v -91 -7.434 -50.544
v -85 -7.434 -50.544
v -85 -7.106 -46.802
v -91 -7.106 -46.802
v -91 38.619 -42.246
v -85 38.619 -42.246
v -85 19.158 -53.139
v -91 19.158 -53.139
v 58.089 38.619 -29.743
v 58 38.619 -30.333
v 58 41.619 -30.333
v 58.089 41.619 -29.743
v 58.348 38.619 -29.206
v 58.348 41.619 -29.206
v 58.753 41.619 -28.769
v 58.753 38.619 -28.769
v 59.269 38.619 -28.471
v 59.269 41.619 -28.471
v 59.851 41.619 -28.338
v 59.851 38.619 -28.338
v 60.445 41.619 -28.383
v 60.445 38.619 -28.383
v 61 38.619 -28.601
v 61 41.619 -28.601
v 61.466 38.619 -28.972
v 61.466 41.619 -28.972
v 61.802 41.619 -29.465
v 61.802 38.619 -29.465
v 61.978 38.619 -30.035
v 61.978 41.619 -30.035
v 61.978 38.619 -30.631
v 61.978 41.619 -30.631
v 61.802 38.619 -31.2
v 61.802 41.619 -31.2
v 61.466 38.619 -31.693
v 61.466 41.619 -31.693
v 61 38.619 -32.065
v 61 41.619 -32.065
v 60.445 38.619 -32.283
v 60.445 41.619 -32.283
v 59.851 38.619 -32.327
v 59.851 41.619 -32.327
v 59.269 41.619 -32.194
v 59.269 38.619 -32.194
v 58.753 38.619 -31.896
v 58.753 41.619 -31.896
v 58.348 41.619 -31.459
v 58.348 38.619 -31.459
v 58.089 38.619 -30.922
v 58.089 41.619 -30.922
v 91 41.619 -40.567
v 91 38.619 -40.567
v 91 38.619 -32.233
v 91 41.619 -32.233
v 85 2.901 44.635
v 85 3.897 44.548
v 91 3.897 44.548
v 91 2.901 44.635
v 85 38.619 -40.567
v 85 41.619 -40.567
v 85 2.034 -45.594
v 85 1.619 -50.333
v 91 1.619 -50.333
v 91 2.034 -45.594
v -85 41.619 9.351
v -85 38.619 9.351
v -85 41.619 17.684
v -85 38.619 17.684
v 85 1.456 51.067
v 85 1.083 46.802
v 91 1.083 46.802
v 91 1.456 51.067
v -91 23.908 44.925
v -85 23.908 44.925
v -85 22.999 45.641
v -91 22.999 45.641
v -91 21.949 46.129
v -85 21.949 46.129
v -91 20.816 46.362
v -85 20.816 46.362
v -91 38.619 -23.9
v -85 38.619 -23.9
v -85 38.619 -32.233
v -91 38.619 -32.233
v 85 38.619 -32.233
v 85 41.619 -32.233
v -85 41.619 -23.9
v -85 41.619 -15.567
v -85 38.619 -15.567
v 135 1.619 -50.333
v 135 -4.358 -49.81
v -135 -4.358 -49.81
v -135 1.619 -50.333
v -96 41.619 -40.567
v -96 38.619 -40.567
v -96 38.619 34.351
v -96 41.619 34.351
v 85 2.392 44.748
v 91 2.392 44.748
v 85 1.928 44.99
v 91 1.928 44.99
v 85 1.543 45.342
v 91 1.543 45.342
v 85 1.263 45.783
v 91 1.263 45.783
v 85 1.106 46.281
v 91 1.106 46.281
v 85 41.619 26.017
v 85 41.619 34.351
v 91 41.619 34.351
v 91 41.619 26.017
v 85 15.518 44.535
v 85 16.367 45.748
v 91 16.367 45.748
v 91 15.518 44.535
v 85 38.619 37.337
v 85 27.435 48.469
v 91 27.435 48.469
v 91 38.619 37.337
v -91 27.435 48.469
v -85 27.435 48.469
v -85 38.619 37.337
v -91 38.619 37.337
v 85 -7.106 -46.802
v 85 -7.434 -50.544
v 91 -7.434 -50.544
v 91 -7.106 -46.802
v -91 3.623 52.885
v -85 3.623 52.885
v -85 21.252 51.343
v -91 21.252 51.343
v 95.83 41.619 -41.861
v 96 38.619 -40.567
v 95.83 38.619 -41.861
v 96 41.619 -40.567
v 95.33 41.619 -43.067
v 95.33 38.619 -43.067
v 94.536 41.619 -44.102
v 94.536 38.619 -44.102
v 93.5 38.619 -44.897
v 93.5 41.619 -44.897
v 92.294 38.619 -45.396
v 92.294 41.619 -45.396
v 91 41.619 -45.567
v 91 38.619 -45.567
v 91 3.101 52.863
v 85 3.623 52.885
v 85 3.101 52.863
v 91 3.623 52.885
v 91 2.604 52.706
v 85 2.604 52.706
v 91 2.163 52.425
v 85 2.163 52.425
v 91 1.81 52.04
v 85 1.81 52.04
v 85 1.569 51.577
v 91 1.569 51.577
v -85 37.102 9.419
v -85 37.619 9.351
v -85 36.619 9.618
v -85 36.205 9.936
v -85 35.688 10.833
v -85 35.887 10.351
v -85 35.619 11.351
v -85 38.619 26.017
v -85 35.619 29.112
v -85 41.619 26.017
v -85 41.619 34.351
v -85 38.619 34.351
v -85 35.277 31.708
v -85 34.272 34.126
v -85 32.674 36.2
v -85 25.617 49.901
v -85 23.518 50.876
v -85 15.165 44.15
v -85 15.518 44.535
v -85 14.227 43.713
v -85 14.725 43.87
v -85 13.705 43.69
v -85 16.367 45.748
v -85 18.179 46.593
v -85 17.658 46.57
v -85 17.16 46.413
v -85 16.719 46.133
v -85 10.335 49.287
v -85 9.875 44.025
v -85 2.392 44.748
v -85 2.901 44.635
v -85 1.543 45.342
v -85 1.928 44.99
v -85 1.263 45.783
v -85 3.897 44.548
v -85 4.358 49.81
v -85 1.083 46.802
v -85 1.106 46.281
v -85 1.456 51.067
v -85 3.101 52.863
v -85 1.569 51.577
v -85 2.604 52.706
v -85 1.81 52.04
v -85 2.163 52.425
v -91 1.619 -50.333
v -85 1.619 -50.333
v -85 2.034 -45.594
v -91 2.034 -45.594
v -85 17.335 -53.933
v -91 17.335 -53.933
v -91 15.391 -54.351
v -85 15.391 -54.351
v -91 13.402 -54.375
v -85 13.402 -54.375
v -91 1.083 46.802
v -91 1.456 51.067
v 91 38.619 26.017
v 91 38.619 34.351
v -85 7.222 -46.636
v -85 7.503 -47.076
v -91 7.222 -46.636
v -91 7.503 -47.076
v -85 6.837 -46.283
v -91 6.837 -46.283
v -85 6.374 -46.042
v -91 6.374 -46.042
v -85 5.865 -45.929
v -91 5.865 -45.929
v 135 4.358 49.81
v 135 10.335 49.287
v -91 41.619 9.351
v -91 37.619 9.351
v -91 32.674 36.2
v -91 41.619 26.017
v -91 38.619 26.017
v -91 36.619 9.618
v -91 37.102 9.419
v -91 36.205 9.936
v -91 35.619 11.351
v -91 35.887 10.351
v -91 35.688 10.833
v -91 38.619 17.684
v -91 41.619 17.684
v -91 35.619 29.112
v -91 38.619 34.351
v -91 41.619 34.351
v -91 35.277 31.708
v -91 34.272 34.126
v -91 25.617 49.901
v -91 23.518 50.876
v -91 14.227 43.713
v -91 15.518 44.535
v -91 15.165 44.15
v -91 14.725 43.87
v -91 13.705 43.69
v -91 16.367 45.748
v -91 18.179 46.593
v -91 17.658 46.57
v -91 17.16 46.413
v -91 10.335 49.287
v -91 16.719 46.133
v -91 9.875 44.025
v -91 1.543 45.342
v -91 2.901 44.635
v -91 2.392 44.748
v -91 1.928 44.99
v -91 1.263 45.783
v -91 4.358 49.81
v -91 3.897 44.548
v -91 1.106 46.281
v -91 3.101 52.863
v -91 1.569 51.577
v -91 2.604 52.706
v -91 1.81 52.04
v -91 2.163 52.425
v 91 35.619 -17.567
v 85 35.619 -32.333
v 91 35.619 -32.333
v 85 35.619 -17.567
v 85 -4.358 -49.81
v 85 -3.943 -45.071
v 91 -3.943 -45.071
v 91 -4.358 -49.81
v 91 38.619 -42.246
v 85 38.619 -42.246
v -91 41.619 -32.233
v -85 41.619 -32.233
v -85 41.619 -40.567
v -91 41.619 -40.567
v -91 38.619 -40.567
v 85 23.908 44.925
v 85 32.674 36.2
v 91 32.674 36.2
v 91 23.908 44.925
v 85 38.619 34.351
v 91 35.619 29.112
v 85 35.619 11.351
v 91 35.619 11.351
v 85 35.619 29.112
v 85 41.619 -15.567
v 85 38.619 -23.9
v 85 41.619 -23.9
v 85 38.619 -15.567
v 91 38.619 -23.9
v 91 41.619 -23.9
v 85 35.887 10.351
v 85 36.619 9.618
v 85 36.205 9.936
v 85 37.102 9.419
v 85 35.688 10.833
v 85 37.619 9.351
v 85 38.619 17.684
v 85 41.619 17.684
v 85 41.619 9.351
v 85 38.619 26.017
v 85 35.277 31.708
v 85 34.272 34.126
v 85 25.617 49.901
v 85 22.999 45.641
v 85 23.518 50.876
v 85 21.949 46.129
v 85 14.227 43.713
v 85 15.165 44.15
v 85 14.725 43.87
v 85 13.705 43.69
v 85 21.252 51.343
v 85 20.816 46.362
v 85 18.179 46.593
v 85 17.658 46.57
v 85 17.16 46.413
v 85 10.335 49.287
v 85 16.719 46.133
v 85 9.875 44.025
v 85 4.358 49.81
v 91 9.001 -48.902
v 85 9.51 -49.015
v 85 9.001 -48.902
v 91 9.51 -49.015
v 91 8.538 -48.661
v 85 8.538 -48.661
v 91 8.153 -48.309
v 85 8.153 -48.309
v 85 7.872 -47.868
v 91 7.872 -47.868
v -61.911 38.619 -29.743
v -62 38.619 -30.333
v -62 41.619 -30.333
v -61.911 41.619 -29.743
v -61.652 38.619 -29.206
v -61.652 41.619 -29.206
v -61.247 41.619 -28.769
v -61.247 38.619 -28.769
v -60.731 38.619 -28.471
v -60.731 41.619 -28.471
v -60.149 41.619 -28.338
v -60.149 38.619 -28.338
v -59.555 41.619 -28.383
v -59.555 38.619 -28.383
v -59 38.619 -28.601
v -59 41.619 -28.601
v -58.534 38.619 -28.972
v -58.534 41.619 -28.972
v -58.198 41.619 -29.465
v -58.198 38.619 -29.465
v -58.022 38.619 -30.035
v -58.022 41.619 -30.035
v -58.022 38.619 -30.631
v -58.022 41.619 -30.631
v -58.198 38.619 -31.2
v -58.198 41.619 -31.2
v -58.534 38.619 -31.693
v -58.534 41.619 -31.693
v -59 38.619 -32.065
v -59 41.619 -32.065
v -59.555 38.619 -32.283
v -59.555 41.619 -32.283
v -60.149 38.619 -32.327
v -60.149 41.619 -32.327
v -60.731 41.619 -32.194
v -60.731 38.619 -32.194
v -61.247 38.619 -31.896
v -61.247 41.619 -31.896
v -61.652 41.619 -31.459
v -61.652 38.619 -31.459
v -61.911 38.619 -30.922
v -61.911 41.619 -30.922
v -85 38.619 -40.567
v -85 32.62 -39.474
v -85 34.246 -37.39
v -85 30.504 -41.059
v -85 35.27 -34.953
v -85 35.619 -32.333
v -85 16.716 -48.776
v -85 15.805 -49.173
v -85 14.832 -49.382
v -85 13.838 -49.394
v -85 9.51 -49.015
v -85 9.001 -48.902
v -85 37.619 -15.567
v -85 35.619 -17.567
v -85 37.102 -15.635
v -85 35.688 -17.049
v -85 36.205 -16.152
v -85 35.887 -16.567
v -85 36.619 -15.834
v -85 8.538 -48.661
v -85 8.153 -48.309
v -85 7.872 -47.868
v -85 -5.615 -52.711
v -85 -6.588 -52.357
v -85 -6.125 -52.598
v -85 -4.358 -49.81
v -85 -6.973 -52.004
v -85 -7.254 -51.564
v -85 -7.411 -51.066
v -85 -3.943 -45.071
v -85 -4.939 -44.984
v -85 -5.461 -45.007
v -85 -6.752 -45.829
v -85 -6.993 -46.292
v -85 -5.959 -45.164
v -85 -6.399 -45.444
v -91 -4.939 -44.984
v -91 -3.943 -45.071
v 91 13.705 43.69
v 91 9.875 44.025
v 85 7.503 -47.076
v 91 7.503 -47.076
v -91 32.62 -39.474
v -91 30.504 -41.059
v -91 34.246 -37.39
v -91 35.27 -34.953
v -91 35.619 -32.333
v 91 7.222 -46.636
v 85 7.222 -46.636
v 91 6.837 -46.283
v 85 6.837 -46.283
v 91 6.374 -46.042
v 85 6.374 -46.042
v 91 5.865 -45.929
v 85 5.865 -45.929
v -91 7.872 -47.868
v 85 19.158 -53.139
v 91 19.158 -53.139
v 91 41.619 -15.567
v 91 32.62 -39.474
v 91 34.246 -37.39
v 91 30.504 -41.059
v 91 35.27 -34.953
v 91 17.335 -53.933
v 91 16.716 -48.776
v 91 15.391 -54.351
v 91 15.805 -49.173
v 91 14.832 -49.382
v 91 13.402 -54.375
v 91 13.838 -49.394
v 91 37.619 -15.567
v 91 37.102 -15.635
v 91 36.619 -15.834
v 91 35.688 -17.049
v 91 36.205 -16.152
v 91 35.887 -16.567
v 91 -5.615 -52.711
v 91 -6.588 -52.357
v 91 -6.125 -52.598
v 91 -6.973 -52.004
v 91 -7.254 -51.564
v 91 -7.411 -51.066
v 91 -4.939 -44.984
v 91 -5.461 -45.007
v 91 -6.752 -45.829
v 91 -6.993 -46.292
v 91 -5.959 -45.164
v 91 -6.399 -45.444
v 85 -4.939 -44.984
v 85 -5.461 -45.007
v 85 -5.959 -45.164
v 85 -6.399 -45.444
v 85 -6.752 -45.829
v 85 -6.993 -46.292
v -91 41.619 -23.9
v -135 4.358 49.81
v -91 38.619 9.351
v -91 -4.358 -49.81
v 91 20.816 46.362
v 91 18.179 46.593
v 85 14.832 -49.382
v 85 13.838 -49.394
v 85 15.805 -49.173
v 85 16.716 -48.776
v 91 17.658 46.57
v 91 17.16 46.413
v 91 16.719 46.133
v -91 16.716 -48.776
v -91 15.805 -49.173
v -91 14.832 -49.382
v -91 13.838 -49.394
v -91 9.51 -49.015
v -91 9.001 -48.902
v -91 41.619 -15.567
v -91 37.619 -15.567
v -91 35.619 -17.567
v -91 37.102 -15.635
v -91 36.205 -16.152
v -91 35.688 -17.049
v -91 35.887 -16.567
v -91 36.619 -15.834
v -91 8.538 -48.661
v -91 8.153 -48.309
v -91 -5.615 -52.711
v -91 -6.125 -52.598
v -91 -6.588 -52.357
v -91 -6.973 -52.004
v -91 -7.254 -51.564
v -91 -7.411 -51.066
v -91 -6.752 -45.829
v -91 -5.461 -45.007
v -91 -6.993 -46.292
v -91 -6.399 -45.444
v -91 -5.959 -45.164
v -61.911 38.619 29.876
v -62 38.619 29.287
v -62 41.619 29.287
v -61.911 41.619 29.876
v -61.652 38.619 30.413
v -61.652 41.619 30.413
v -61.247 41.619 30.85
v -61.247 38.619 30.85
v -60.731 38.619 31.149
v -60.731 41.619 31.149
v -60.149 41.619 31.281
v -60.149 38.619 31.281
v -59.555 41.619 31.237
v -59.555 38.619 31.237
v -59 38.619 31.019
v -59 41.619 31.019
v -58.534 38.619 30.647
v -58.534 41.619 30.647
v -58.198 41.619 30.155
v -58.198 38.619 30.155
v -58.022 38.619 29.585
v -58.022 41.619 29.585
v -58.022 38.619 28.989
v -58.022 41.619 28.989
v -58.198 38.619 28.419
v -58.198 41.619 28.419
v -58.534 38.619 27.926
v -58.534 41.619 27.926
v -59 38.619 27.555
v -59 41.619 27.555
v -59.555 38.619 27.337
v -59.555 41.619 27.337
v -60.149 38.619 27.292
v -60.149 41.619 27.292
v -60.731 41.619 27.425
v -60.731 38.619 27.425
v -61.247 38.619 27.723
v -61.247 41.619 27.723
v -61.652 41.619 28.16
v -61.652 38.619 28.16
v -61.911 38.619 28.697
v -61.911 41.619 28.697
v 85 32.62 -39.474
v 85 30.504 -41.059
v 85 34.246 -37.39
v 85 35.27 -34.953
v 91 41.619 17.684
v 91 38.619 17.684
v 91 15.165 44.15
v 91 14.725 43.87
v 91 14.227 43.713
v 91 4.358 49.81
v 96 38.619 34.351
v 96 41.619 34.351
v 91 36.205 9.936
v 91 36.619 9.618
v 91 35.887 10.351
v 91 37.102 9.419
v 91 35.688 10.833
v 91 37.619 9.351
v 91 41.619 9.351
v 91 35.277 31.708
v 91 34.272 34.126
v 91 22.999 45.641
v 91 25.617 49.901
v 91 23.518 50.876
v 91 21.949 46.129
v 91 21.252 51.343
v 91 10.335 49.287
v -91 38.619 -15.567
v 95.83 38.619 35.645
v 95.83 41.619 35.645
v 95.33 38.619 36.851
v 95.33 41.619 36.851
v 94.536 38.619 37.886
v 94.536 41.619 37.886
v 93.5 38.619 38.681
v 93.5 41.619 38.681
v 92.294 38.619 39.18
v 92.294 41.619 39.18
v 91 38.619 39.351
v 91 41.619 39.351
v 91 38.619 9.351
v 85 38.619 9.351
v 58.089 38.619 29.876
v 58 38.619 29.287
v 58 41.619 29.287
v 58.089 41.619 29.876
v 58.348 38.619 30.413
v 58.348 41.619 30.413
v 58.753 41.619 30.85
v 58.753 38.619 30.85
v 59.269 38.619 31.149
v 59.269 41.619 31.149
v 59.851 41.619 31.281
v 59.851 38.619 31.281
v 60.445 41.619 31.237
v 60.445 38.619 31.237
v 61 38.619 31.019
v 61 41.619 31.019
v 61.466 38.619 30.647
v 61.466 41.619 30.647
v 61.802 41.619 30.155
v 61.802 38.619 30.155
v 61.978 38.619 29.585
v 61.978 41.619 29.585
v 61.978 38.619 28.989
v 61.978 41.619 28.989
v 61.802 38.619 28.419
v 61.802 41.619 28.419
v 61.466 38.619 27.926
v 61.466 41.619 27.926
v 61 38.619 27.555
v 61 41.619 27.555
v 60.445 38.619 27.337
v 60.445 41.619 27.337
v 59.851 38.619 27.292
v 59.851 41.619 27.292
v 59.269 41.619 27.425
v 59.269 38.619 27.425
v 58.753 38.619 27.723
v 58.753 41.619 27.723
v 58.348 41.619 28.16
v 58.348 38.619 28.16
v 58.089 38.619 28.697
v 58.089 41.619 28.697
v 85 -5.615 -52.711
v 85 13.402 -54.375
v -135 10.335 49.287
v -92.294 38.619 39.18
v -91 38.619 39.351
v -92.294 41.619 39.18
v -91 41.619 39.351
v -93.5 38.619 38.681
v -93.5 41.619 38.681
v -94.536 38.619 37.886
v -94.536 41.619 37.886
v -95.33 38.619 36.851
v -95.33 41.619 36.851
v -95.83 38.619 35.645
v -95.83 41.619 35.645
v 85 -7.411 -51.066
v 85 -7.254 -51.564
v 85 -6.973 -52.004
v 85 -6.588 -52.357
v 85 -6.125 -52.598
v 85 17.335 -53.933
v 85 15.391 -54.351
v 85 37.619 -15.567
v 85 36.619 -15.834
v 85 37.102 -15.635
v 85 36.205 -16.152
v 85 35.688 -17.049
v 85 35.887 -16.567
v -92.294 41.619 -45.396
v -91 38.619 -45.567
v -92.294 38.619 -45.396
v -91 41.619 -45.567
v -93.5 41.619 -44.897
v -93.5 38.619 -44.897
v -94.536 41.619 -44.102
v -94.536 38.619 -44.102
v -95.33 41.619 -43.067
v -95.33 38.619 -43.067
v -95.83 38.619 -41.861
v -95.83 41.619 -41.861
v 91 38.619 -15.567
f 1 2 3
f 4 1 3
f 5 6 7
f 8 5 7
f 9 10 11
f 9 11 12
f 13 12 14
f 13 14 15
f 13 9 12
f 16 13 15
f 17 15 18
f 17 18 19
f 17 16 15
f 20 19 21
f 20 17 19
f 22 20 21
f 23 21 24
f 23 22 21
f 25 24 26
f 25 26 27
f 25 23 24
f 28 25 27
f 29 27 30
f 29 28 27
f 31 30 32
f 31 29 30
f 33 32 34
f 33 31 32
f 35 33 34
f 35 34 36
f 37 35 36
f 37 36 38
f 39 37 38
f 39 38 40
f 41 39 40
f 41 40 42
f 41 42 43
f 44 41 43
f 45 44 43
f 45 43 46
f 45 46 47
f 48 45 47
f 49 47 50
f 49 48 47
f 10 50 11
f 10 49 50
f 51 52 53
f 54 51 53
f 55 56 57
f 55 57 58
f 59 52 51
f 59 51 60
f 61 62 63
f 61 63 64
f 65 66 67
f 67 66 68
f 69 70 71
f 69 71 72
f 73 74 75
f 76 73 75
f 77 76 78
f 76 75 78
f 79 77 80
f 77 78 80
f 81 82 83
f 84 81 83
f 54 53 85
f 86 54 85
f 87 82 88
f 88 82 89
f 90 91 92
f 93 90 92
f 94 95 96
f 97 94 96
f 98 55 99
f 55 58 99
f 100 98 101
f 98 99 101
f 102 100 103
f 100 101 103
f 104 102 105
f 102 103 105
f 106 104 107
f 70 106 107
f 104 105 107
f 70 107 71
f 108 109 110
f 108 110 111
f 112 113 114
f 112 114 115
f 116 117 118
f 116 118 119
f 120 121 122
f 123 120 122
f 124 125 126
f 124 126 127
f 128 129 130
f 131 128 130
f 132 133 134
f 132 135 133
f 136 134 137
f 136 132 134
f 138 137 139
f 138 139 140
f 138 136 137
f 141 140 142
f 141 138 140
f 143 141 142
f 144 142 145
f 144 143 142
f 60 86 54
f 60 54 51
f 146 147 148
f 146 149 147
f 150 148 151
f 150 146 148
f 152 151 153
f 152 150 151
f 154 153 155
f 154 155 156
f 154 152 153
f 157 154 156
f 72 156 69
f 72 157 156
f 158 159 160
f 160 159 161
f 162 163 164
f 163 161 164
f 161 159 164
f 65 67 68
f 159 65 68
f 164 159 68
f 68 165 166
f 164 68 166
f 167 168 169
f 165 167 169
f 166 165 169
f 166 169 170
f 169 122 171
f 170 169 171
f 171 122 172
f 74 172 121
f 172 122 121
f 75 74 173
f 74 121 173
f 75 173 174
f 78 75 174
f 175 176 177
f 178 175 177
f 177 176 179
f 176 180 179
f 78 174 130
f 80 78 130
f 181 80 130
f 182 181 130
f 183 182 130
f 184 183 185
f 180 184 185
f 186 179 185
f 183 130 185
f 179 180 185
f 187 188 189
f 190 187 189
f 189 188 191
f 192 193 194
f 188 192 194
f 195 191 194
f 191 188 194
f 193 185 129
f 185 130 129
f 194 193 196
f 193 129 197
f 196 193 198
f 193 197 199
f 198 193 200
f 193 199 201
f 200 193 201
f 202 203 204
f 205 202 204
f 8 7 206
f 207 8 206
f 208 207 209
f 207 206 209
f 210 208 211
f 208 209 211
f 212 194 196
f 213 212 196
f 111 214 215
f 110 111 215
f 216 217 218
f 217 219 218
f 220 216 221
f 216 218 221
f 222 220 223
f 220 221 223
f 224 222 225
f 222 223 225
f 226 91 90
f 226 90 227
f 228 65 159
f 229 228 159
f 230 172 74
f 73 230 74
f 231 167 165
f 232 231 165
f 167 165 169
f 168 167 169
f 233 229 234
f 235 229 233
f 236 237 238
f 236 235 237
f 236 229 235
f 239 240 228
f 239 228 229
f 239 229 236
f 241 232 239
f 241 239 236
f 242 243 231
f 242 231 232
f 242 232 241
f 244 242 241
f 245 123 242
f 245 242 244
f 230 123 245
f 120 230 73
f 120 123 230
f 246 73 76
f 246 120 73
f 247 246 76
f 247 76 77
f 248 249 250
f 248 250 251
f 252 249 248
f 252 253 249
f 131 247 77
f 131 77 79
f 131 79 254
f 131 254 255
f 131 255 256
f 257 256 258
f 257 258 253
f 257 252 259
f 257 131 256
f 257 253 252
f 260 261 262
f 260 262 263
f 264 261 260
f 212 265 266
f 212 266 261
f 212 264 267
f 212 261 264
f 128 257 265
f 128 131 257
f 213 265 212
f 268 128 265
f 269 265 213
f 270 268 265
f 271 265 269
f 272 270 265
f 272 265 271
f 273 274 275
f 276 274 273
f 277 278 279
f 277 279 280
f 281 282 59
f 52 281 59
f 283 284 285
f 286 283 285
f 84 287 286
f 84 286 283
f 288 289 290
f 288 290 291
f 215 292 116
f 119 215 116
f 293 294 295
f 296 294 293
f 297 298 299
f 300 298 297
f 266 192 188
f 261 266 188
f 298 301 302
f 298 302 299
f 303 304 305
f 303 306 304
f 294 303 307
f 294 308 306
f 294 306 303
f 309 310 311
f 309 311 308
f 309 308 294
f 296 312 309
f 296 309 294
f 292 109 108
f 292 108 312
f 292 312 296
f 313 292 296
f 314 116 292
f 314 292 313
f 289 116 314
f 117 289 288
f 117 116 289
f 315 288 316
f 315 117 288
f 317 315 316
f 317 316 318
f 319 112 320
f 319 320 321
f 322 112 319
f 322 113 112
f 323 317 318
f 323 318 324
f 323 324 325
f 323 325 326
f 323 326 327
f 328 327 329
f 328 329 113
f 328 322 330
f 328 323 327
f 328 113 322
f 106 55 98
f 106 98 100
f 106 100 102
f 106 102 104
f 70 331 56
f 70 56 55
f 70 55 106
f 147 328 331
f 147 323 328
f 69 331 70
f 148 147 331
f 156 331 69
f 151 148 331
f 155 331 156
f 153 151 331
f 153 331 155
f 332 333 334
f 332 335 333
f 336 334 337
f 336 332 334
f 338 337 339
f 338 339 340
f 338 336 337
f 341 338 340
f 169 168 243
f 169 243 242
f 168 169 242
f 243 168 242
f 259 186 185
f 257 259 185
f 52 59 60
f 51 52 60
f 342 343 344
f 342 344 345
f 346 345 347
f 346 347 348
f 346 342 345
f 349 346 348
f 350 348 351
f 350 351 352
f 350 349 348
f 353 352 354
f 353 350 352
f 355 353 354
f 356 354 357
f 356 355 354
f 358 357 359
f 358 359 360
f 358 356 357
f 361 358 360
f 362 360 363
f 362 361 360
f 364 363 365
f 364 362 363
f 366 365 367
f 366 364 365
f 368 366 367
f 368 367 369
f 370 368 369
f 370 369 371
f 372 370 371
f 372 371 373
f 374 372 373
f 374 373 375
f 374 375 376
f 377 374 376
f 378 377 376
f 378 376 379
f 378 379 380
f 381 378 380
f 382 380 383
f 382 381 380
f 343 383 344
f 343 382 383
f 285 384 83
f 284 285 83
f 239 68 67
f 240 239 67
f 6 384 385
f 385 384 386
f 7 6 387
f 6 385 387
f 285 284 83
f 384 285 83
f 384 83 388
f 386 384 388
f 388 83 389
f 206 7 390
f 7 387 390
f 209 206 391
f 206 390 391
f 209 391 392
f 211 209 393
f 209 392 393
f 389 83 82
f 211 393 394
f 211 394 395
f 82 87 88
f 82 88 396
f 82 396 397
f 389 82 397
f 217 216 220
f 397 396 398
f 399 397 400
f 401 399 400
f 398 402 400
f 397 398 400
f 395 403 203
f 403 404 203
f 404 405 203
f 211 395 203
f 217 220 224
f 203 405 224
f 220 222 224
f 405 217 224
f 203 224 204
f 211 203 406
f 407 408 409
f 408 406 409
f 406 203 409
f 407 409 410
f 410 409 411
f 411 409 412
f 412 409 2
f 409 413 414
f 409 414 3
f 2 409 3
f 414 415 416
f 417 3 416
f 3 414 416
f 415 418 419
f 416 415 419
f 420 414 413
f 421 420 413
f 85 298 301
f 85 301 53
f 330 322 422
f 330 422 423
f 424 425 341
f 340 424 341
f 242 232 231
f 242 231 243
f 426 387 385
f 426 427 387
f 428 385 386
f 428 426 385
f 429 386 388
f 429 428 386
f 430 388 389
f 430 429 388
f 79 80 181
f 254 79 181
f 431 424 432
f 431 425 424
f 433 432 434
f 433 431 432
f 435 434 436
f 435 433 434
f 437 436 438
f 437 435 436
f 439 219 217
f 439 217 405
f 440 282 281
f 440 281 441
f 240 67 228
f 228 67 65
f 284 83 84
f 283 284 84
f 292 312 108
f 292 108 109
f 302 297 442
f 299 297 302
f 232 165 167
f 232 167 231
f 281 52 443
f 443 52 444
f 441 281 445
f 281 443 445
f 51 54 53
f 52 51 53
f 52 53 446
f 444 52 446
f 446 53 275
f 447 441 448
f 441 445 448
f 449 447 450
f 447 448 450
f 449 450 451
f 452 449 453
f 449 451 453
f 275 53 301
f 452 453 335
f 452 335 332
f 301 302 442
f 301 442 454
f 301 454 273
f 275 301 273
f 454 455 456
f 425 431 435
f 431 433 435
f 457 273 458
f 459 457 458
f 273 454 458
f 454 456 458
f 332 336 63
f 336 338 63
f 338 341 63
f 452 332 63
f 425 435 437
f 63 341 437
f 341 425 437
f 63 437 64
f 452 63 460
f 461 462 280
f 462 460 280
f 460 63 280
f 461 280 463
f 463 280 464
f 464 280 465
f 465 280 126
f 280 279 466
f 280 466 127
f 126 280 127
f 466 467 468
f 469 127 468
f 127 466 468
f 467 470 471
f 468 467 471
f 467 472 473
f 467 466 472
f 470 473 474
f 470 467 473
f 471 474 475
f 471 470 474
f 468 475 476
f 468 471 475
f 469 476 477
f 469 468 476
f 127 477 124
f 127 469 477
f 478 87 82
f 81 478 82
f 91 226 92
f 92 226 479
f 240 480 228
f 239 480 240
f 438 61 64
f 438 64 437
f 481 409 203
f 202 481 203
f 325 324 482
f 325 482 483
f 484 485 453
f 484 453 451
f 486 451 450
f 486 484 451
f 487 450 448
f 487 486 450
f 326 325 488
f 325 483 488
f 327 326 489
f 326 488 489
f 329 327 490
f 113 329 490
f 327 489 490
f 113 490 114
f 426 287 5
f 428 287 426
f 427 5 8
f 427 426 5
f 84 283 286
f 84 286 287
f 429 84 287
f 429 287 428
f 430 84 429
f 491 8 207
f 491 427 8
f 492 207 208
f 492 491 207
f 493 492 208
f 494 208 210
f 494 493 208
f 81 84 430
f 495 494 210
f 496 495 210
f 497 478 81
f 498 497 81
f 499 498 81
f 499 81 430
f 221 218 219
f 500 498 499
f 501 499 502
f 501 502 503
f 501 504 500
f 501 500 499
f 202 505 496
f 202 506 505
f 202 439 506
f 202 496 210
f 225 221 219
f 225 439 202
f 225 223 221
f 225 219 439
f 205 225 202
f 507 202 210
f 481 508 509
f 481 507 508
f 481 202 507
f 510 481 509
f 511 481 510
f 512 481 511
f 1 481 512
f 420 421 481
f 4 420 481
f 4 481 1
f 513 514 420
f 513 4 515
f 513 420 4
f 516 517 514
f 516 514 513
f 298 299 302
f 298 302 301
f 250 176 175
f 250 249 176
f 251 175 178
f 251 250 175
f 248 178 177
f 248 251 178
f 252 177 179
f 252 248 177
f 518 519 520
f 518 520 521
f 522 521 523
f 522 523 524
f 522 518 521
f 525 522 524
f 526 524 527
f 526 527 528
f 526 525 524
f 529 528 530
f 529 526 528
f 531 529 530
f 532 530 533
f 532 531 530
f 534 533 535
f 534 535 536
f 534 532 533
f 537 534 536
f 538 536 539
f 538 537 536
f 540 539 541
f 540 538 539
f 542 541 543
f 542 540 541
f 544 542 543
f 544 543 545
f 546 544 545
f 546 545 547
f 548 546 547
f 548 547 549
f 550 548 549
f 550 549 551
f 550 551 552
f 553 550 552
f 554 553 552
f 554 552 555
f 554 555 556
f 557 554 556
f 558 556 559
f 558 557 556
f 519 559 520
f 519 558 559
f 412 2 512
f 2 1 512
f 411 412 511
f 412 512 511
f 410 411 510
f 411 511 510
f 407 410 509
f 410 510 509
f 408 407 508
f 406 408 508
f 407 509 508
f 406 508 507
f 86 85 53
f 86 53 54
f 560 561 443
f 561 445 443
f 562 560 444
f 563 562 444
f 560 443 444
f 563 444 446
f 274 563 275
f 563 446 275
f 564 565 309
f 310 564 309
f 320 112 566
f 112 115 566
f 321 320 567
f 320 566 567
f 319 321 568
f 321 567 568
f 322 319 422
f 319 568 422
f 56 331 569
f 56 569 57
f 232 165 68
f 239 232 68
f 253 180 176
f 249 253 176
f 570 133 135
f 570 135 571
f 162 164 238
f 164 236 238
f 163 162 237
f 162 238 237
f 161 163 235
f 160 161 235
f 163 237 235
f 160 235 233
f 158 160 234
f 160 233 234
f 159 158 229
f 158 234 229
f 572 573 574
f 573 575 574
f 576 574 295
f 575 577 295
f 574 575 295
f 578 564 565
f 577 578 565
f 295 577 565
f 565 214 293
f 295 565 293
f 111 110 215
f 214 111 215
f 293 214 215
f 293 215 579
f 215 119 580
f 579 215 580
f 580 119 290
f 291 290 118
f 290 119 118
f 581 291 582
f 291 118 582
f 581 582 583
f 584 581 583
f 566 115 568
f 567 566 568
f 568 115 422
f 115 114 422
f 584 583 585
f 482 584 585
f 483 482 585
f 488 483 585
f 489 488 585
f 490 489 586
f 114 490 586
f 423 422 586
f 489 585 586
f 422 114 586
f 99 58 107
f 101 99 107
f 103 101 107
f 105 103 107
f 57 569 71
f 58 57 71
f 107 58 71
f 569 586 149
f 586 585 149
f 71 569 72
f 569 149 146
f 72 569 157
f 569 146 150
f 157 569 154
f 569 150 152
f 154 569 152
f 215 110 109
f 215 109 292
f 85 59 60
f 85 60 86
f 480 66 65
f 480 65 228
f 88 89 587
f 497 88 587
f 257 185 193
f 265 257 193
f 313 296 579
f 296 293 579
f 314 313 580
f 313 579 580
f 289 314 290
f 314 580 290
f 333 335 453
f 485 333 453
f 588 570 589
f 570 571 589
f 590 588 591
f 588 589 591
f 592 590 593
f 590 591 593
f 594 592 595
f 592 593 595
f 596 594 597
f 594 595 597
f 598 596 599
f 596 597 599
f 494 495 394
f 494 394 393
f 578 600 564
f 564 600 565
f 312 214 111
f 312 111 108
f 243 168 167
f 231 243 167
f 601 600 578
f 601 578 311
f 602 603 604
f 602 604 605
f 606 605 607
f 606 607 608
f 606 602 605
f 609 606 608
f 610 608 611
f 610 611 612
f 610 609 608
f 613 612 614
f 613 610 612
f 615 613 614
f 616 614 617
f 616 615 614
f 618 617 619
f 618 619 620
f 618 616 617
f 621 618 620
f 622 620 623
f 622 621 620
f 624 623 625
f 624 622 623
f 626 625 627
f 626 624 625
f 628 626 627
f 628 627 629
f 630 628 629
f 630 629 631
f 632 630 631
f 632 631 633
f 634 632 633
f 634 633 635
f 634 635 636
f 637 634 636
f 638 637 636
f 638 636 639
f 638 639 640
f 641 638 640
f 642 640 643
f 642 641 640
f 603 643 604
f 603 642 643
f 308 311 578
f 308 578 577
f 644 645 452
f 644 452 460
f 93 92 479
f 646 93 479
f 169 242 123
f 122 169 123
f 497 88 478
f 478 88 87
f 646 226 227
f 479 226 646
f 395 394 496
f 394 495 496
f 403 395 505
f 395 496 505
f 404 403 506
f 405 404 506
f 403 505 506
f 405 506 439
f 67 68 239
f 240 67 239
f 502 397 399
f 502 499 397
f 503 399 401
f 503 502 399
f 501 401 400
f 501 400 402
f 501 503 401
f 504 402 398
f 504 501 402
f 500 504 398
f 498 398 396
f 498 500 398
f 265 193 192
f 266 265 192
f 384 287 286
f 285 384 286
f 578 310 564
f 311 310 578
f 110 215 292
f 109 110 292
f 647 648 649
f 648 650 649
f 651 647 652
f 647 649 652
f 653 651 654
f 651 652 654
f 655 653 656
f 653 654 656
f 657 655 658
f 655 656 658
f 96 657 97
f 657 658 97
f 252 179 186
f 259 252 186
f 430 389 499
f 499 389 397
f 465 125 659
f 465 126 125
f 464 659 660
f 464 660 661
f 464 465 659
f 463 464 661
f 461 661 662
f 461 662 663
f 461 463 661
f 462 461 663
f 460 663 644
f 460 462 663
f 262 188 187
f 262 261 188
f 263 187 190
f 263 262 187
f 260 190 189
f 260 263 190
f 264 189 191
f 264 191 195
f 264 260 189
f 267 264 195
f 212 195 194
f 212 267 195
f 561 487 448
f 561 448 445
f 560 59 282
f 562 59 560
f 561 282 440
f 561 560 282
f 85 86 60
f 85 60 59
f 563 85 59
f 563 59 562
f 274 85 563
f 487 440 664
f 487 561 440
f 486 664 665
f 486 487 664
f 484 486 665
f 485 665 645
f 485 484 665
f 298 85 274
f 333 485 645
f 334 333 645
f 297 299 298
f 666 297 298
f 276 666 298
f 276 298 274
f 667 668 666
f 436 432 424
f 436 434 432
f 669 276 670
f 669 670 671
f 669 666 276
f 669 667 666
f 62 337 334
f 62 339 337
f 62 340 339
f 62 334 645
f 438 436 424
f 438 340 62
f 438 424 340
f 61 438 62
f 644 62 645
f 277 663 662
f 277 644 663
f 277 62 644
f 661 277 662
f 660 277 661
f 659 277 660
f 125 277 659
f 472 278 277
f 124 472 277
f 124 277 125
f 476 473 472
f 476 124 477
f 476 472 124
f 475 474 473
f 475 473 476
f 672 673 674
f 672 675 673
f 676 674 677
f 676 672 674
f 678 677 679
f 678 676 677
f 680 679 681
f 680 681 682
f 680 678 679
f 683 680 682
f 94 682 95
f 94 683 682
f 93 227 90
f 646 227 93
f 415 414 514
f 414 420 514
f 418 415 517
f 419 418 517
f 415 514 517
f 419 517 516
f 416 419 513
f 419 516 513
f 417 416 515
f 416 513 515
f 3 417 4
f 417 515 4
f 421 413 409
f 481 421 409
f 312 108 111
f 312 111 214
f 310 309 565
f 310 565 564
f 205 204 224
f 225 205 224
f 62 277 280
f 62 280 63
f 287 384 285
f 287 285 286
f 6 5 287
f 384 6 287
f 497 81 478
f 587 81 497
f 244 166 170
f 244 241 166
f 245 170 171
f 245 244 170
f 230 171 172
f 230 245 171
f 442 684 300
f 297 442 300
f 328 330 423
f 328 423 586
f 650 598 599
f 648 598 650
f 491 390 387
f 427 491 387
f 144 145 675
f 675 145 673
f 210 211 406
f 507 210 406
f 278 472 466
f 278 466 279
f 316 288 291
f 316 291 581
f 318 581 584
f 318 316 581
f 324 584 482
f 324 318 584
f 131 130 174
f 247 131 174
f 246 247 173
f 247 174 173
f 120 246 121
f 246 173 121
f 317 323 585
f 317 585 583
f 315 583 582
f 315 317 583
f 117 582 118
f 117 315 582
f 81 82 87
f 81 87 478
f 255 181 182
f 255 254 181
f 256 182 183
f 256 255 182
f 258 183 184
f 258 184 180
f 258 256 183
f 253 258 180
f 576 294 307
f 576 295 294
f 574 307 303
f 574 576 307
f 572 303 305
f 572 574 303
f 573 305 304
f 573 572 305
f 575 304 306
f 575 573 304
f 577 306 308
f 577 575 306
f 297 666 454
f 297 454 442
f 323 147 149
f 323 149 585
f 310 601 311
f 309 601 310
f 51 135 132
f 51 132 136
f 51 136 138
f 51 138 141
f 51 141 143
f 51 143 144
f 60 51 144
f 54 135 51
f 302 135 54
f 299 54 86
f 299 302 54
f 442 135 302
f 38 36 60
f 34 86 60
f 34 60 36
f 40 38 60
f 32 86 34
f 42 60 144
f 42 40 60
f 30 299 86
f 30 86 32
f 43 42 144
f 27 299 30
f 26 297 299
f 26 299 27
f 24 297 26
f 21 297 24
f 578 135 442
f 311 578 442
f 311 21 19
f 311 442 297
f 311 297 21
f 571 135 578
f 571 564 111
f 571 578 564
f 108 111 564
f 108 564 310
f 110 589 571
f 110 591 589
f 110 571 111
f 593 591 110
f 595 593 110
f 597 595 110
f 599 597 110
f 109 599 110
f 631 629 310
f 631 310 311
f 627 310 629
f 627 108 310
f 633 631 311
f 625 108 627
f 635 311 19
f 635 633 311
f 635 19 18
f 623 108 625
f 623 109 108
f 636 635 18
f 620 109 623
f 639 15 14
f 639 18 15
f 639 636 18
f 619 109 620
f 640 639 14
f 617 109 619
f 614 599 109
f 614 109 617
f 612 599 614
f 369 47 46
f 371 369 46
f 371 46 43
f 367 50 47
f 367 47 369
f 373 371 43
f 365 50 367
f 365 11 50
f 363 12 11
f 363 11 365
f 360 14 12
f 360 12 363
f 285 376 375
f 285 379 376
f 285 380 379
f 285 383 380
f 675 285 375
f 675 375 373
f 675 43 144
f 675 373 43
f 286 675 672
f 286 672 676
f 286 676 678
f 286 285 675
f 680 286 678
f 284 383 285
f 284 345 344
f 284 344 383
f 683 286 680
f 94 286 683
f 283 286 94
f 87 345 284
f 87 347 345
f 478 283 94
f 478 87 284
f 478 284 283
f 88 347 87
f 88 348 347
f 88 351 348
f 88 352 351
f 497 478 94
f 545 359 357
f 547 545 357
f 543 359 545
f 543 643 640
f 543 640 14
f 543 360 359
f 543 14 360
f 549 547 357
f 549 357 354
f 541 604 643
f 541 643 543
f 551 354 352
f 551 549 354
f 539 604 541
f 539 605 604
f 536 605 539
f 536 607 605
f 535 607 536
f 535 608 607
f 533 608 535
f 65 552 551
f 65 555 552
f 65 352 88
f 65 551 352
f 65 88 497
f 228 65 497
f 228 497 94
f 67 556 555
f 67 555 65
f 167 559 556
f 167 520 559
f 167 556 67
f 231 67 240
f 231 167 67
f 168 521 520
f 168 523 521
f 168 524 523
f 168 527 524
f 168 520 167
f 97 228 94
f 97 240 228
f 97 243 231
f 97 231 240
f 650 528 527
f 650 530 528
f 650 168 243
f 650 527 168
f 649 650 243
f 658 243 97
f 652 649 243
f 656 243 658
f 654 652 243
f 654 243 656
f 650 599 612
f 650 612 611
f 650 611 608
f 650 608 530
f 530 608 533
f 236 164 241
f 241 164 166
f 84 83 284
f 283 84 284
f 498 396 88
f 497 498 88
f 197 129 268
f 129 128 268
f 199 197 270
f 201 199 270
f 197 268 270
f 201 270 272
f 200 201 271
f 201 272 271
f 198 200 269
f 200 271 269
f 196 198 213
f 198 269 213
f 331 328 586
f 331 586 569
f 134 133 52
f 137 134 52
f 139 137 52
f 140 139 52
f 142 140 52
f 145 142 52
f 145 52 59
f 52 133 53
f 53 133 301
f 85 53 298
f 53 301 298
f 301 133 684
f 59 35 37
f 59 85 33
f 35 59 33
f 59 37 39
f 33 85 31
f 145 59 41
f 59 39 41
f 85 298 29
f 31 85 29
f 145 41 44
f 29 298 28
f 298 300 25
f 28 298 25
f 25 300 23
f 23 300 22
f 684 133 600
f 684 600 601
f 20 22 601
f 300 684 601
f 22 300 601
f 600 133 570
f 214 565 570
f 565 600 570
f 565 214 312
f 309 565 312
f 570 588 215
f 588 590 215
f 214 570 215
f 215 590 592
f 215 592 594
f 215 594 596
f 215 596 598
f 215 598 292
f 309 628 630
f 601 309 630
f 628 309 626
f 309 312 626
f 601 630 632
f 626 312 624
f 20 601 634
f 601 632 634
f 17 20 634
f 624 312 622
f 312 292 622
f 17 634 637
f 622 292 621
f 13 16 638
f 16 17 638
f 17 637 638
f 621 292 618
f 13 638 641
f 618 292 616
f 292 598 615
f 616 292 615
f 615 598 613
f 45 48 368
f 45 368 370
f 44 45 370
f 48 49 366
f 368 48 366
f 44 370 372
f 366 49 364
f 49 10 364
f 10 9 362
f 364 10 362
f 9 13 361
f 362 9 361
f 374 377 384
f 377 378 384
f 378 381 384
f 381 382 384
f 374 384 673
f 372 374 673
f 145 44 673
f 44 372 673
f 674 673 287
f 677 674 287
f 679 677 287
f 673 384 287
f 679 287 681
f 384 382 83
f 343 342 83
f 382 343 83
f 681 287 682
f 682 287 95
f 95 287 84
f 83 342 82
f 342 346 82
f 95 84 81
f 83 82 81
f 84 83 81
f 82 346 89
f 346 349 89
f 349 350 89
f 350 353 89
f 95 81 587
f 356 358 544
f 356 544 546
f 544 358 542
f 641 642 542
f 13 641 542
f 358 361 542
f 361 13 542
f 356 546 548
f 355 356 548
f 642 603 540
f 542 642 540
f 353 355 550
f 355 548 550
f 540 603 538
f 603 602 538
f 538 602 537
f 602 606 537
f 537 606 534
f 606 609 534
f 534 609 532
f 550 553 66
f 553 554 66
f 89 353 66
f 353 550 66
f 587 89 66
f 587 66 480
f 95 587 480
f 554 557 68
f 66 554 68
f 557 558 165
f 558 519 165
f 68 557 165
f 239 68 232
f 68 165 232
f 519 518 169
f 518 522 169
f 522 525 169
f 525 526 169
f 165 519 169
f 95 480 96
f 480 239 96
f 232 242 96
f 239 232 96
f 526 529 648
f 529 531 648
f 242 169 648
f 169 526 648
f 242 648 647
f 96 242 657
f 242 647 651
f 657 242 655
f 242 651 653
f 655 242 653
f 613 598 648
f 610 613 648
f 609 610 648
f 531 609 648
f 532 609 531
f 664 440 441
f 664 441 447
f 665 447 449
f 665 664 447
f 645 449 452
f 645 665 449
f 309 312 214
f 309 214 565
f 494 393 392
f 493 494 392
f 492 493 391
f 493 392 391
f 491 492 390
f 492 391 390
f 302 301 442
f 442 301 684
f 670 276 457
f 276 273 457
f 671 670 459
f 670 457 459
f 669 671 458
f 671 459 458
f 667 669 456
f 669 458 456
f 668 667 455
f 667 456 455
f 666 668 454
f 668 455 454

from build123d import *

# Parameters (mm, degrees)
F2_W      = 270
F2_H      = 100
F3_DEPTH  = 6
F6_DEPTH  = 6
F8_R      = 10
F8_2_R    = 10
F8_3_R    = 10
F8_4_R    = 10
F9_R      = 2
F9_2_R    = 2
F9_3_R    = 2
F9_4_R    = 2
F10_W     = 192
F10_H     = 84.9170803202
F10_W_2   = 6
F10_H_2   = 8.3333333333
F10_R     = 2
F11_DEPTH = 3
F12_R     = 5
F14_DEPTH = 703


with BuildPart() as f3:
    # F2 (on line) → F3 (new body)
    with BuildSketch(Plane(origin=(0, 0, 0), x_dir=(-1, 0, 0), z_dir=(0, 0.9961946981, -0.0871557427))):
        Rectangle(F2_W, F2_H)
    extrude(amount=F3_DEPTH)


with BuildPart() as f6:
    # F5 (on offset) → F6 (new body)
    with BuildSketch(Plane(origin=(-85, 0, 0), x_dir=(0, -1, 0), z_dir=(-1, 0, 0))):
        with BuildLine():
            Line((-3.8974684014, 44.5482676763), (-0.9088843071, 44.8097349046))
            Line((-0.9088843071, 44.8097349046), (-1.6306702714, 53.0597862271))
            Line((-1.6306702714, 53.0597862271), (-21.2518680197, 51.3431538593))
            ThreePointArc((-21.2518680197, 51.3431538593), (-24.5958757045, 50.4492282053), (-27.4347958571, 48.46881844))
            Line((-27.4347958571, 48.46881844), (-41.6193810512, 34.350529596))
            Line((-41.6193810512, 34.350529596), (-41.6193810512, 26.0171962627))
            Line((-41.6193810512, 26.0171962627), (-38.6193810512, 26.0171962627))
            Line((-38.6193810512, 26.0171962627), (-38.6193810512, 17.6838629293))
            Line((-38.6193810512, 17.6838629293), (-41.6193810512, 17.6838629293))
            Line((-41.6193810512, 17.6838629293), (-41.6193810512, 9.350529596))
            Line((-41.6193810512, 9.350529596), (-35.6193810512, 9.350529596))
            Line((-35.6193810512, 9.350529596), (-35.6193810512, 33.2679239334))
            Line((-35.6193810512, 33.2679239334), (-23.9075532246, 44.9250126592))
            ThreePointArc((-23.9075532246, 44.9250126592), (-22.4880931483, 45.9152175418), (-20.8160893059, 46.3621803689))
            Line((-20.8160893059, 46.3621803689), (-17.0290202972, 46.6935059751))
            Line((-17.0290202972, 46.6935059751), (-14.8556100804, 43.5895545061))
            Line((-14.8556100804, 43.5895545061), (-9.8746365899, 44.0253332199))
            Line((-9.8746365899, 44.0253332199), (-10.3349553259, 49.2868004481))
            Line((-10.3349553259, 49.2868004481), (-4.3577871374, 49.8097349046))
            Line((-4.3577871374, 49.8097349046), (-3.8974684014, 44.5482676763))
        make_face()
    extrude(amount=F6_DEPTH)


with BuildPart() as f6b:
    # F5 (on offset) → F6, piece 2 (new body)
    with BuildSketch(Plane(origin=(-85, 0, 0), x_dir=(0, -1, 0), z_dir=(-1, 0, 0))):
        with BuildLine():
            Line((6.9318033324, -44.8097349046), (3.9432192381, -45.0712021328))
            Line((3.9432192381, -45.0712021328), (4.3577871374, -49.8097349046))
            Line((4.3577871374, -49.8097349046), (-1.6193810512, -50.3326693611))
            Line((-1.6193810512, -50.3326693611), (-2.0339489504, -45.5941365893))
            Line((-2.0339489504, -45.5941365893), (-7.0149224409, -46.0299153031))
            Line((-7.0149224409, -46.0299153031), (-8.3601526442, -48.9147707838))
            Line((-8.3601526442, -48.9147707838), (-13.8382536726, -49.3940425214))
            ThreePointArc((-13.8382536726, -49.3940425214), (-15.3237410956, -49.3016385176), (-16.7162154514, -48.7760659227))
            Line((-16.7162154514, -48.7760659227), (-35.6193810512, -38.1950382371))
            Line((-35.6193810512, -38.1950382371), (-35.6193810512, -15.5665507242))
            Line((-35.6193810512, -15.5665507242), (-41.6193810512, -15.5665507242))
            Line((-41.6193810512, -15.5665507242), (-41.6193810512, -23.8998840575))
            Line((-41.6193810512, -23.8998840575), (-38.6193810512, -23.8998840575))
            Line((-38.6193810512, -23.8998840575), (-38.6193810512, -32.2332173909))
            Line((-38.6193810512, -32.2332173909), (-41.6193810512, -32.2332173909))
            Line((-41.6193810512, -32.2332173909), (-41.6193810512, -40.5665507242))
            Line((-41.6193810512, -40.5665507242), (-19.1583985164, -53.1390628144))
            ThreePointArc((-19.1583985164, -53.1390628144), (-16.3734498049, -54.1902080042), (-13.4024749589, -54.3750160119))
            Line((-13.4024749589, -54.3750160119), (7.6078384599, -52.5368517706))
            Line((7.6078384599, -52.5368517706), (6.9318033324, -44.8097349046))
        make_face()
    extrude(amount=F6_DEPTH)


with BuildPart() as f7_1:
    # F7: instance of F6
    add(f6.part.mirror(Plane.YZ))

    # F8#3
    f8_3_edges = [f7_1.edges().sort_by_distance(p)[0] for p in [
        (88, 35.619381, 33.267924),
    ]]
    fillet(f8_3_edges, radius=F8_3_R)

    # F9#3
    f9_3_edges = [f7_1.edges().sort_by_distance(p)[0] for p in [
        (88, 35.619381, 9.35053),
        (88, 1.63067, 53.059786),
        (88, 0.908884, 44.809735),
        (88, 17.02902, 46.693506),
        (88, 14.85561, 43.589555),
    ]]
    fillet(f9_3_edges, radius=F9_3_R)


with BuildPart() as f7_2:
    # F7: instance of F6b
    add(f6b.part.mirror(Plane.YZ))

    # F8#4
    f8_4_edges = [f7_2.edges().sort_by_distance(p)[0] for p in [
        (88, 35.619381, -38.195038),
    ]]
    fillet(f8_4_edges, radius=F8_4_R)

    # F9#4
    f9_4_edges = [f7_2.edges().sort_by_distance(p)[0] for p in [
        (88, 7.014922, -46.029915),
        (88, 8.360153, -48.914771),
        (88, 35.619381, -15.566551),
        (88, -6.931803, -44.809735),
        (88, -7.607838, -52.536852),
    ]]
    fillet(f9_4_edges, radius=F9_4_R)


with BuildPart() as f6_1:
    add(f6.part)

    # F8
    f8_edges = [f6_1.edges().sort_by_distance(p)[0] for p in [
        (-88, 35.619381, 33.267924),
    ]]
    fillet(f8_edges, radius=F8_R)

    # F9
    f9_edges = [f6_1.edges().sort_by_distance(p)[0] for p in [
        (-88, 35.619381, 9.35053),
        (-88, 1.63067, 53.059786),
        (-88, 0.908884, 44.809735),
        (-88, 17.02902, 46.693506),
        (-88, 14.85561, 43.589555),
    ]]
    fillet(f9_edges, radius=F9_R)


with BuildPart() as f6b_1:
    add(f6b.part)

    # F8#2
    f8_2_edges = [f6b_1.edges().sort_by_distance(p)[0] for p in [
        (-88, 35.619381, -38.195038),
    ]]
    fillet(f8_2_edges, radius=F8_2_R)

    # F9#2
    f9_2_edges = [f6b_1.edges().sort_by_distance(p)[0] for p in [
        (-88, 35.619381, -15.566551),
        (-88, -6.931803, -44.809735),
        (-88, -7.607838, -52.536852),
        (-88, 8.360153, -48.914771),
        (-88, 7.014922, -46.029915),
    ]]
    fillet(f9_2_edges, radius=F9_2_R)


with BuildPart() as f11:
    # F10 (on face) → F11 (new body)
    with BuildSketch(Plane(origin=(0, 38.6193810512, 0), x_dir=(-1, 0, 0), z_dir=(0, 1, 0))):
        with Locations((0, -3.1080105641)):
            Rectangle(F10_W, F10_H)
        with Locations((-88, -36.3998840575)):
            Rectangle(F10_W_2, F10_H_2, mode=Mode.SUBTRACT)
        with Locations((-60, -30.3326693611)):
            Circle(F10_R, mode=Mode.SUBTRACT)
        with Locations((-88, -19.7332173909)):
            Rectangle(F10_W_2, F10_H_2, mode=Mode.SUBTRACT)
        with Locations((88, -36.3998840575)):
            Rectangle(F10_W_2, F10_H_2, mode=Mode.SUBTRACT)
        with Locations((60, -30.3326693611)):
            Circle(F10_R, mode=Mode.SUBTRACT)
        with Locations((88, -19.7332173909)):
            Rectangle(F10_W_2, F10_H_2, mode=Mode.SUBTRACT)
        with Locations((-88, 13.5171962627)):
            Rectangle(F10_W_2, F10_H_2, mode=Mode.SUBTRACT)
        with Locations((-88, 30.1838629293)):
            Rectangle(F10_W_2, F10_H_2, mode=Mode.SUBTRACT)
        with Locations((-60, 29.2868004481)):
            Circle(F10_R, mode=Mode.SUBTRACT)
        with Locations((88, 13.5171962627)):
            Rectangle(F10_W_2, F10_H_2, mode=Mode.SUBTRACT)
        with Locations((60, 29.2868004481)):
            Circle(F10_R, mode=Mode.SUBTRACT)
        with Locations((88, 30.1838629293)):
            Rectangle(F10_W_2, F10_H_2, mode=Mode.SUBTRACT)
    extrude(amount=F11_DEPTH)

    # F12
    f12_edges = [f11.edges().sort_by_distance(p)[0] for p in [
        (96, 40.119381, 39.35053),
        (96, 40.119381, -45.566551),
        (-96, 40.119381, -45.566551),
        (-96, 40.119381, 39.35053),
    ]]
    fillet(f12_edges, radius=F12_R)


with BuildPart() as f14_tool:
    # F13 (on face) → F14 (new body)
    with BuildSketch(Plane(origin=(-91, 0, 0), x_dir=(0, -1, 0), z_dir=(-1, 0, 0))):
        Polygon((-38.6193810512, 40.4036790133), (-43.4263913442, 34.350529596), (-38.6193810512, 34.350529596), align=None)
        Polygon((-38.6193810512, -40.5665507242), (-45.0114011765, -40.5665507242), (-38.6193810512, -48.2738559767), align=None)
    extrude(amount=-F14_DEPTH)


with BuildPart() as f6_2:
    add(f6_1.part)

    # F14: cut by f14_tool
    add(f14_tool.part, mode=Mode.SUBTRACT)


with BuildPart() as f6b_2:
    add(f6b_1.part)

    # F14: cut by f14_tool
    add(f14_tool.part, mode=Mode.SUBTRACT)


with BuildPart() as f7_1_1:
    add(f7_1.part)

    # F14: cut by f14_tool
    add(f14_tool.part, mode=Mode.SUBTRACT)


with BuildPart() as f7_2_1:
    add(f7_2.part)

    # F14: cut by f14_tool
    add(f14_tool.part, mode=Mode.SUBTRACT)


solid = Compound([f3.part, f11.part, f6_2.part, f6b_2.part, f7_1_1.part, f7_2_1.part])
